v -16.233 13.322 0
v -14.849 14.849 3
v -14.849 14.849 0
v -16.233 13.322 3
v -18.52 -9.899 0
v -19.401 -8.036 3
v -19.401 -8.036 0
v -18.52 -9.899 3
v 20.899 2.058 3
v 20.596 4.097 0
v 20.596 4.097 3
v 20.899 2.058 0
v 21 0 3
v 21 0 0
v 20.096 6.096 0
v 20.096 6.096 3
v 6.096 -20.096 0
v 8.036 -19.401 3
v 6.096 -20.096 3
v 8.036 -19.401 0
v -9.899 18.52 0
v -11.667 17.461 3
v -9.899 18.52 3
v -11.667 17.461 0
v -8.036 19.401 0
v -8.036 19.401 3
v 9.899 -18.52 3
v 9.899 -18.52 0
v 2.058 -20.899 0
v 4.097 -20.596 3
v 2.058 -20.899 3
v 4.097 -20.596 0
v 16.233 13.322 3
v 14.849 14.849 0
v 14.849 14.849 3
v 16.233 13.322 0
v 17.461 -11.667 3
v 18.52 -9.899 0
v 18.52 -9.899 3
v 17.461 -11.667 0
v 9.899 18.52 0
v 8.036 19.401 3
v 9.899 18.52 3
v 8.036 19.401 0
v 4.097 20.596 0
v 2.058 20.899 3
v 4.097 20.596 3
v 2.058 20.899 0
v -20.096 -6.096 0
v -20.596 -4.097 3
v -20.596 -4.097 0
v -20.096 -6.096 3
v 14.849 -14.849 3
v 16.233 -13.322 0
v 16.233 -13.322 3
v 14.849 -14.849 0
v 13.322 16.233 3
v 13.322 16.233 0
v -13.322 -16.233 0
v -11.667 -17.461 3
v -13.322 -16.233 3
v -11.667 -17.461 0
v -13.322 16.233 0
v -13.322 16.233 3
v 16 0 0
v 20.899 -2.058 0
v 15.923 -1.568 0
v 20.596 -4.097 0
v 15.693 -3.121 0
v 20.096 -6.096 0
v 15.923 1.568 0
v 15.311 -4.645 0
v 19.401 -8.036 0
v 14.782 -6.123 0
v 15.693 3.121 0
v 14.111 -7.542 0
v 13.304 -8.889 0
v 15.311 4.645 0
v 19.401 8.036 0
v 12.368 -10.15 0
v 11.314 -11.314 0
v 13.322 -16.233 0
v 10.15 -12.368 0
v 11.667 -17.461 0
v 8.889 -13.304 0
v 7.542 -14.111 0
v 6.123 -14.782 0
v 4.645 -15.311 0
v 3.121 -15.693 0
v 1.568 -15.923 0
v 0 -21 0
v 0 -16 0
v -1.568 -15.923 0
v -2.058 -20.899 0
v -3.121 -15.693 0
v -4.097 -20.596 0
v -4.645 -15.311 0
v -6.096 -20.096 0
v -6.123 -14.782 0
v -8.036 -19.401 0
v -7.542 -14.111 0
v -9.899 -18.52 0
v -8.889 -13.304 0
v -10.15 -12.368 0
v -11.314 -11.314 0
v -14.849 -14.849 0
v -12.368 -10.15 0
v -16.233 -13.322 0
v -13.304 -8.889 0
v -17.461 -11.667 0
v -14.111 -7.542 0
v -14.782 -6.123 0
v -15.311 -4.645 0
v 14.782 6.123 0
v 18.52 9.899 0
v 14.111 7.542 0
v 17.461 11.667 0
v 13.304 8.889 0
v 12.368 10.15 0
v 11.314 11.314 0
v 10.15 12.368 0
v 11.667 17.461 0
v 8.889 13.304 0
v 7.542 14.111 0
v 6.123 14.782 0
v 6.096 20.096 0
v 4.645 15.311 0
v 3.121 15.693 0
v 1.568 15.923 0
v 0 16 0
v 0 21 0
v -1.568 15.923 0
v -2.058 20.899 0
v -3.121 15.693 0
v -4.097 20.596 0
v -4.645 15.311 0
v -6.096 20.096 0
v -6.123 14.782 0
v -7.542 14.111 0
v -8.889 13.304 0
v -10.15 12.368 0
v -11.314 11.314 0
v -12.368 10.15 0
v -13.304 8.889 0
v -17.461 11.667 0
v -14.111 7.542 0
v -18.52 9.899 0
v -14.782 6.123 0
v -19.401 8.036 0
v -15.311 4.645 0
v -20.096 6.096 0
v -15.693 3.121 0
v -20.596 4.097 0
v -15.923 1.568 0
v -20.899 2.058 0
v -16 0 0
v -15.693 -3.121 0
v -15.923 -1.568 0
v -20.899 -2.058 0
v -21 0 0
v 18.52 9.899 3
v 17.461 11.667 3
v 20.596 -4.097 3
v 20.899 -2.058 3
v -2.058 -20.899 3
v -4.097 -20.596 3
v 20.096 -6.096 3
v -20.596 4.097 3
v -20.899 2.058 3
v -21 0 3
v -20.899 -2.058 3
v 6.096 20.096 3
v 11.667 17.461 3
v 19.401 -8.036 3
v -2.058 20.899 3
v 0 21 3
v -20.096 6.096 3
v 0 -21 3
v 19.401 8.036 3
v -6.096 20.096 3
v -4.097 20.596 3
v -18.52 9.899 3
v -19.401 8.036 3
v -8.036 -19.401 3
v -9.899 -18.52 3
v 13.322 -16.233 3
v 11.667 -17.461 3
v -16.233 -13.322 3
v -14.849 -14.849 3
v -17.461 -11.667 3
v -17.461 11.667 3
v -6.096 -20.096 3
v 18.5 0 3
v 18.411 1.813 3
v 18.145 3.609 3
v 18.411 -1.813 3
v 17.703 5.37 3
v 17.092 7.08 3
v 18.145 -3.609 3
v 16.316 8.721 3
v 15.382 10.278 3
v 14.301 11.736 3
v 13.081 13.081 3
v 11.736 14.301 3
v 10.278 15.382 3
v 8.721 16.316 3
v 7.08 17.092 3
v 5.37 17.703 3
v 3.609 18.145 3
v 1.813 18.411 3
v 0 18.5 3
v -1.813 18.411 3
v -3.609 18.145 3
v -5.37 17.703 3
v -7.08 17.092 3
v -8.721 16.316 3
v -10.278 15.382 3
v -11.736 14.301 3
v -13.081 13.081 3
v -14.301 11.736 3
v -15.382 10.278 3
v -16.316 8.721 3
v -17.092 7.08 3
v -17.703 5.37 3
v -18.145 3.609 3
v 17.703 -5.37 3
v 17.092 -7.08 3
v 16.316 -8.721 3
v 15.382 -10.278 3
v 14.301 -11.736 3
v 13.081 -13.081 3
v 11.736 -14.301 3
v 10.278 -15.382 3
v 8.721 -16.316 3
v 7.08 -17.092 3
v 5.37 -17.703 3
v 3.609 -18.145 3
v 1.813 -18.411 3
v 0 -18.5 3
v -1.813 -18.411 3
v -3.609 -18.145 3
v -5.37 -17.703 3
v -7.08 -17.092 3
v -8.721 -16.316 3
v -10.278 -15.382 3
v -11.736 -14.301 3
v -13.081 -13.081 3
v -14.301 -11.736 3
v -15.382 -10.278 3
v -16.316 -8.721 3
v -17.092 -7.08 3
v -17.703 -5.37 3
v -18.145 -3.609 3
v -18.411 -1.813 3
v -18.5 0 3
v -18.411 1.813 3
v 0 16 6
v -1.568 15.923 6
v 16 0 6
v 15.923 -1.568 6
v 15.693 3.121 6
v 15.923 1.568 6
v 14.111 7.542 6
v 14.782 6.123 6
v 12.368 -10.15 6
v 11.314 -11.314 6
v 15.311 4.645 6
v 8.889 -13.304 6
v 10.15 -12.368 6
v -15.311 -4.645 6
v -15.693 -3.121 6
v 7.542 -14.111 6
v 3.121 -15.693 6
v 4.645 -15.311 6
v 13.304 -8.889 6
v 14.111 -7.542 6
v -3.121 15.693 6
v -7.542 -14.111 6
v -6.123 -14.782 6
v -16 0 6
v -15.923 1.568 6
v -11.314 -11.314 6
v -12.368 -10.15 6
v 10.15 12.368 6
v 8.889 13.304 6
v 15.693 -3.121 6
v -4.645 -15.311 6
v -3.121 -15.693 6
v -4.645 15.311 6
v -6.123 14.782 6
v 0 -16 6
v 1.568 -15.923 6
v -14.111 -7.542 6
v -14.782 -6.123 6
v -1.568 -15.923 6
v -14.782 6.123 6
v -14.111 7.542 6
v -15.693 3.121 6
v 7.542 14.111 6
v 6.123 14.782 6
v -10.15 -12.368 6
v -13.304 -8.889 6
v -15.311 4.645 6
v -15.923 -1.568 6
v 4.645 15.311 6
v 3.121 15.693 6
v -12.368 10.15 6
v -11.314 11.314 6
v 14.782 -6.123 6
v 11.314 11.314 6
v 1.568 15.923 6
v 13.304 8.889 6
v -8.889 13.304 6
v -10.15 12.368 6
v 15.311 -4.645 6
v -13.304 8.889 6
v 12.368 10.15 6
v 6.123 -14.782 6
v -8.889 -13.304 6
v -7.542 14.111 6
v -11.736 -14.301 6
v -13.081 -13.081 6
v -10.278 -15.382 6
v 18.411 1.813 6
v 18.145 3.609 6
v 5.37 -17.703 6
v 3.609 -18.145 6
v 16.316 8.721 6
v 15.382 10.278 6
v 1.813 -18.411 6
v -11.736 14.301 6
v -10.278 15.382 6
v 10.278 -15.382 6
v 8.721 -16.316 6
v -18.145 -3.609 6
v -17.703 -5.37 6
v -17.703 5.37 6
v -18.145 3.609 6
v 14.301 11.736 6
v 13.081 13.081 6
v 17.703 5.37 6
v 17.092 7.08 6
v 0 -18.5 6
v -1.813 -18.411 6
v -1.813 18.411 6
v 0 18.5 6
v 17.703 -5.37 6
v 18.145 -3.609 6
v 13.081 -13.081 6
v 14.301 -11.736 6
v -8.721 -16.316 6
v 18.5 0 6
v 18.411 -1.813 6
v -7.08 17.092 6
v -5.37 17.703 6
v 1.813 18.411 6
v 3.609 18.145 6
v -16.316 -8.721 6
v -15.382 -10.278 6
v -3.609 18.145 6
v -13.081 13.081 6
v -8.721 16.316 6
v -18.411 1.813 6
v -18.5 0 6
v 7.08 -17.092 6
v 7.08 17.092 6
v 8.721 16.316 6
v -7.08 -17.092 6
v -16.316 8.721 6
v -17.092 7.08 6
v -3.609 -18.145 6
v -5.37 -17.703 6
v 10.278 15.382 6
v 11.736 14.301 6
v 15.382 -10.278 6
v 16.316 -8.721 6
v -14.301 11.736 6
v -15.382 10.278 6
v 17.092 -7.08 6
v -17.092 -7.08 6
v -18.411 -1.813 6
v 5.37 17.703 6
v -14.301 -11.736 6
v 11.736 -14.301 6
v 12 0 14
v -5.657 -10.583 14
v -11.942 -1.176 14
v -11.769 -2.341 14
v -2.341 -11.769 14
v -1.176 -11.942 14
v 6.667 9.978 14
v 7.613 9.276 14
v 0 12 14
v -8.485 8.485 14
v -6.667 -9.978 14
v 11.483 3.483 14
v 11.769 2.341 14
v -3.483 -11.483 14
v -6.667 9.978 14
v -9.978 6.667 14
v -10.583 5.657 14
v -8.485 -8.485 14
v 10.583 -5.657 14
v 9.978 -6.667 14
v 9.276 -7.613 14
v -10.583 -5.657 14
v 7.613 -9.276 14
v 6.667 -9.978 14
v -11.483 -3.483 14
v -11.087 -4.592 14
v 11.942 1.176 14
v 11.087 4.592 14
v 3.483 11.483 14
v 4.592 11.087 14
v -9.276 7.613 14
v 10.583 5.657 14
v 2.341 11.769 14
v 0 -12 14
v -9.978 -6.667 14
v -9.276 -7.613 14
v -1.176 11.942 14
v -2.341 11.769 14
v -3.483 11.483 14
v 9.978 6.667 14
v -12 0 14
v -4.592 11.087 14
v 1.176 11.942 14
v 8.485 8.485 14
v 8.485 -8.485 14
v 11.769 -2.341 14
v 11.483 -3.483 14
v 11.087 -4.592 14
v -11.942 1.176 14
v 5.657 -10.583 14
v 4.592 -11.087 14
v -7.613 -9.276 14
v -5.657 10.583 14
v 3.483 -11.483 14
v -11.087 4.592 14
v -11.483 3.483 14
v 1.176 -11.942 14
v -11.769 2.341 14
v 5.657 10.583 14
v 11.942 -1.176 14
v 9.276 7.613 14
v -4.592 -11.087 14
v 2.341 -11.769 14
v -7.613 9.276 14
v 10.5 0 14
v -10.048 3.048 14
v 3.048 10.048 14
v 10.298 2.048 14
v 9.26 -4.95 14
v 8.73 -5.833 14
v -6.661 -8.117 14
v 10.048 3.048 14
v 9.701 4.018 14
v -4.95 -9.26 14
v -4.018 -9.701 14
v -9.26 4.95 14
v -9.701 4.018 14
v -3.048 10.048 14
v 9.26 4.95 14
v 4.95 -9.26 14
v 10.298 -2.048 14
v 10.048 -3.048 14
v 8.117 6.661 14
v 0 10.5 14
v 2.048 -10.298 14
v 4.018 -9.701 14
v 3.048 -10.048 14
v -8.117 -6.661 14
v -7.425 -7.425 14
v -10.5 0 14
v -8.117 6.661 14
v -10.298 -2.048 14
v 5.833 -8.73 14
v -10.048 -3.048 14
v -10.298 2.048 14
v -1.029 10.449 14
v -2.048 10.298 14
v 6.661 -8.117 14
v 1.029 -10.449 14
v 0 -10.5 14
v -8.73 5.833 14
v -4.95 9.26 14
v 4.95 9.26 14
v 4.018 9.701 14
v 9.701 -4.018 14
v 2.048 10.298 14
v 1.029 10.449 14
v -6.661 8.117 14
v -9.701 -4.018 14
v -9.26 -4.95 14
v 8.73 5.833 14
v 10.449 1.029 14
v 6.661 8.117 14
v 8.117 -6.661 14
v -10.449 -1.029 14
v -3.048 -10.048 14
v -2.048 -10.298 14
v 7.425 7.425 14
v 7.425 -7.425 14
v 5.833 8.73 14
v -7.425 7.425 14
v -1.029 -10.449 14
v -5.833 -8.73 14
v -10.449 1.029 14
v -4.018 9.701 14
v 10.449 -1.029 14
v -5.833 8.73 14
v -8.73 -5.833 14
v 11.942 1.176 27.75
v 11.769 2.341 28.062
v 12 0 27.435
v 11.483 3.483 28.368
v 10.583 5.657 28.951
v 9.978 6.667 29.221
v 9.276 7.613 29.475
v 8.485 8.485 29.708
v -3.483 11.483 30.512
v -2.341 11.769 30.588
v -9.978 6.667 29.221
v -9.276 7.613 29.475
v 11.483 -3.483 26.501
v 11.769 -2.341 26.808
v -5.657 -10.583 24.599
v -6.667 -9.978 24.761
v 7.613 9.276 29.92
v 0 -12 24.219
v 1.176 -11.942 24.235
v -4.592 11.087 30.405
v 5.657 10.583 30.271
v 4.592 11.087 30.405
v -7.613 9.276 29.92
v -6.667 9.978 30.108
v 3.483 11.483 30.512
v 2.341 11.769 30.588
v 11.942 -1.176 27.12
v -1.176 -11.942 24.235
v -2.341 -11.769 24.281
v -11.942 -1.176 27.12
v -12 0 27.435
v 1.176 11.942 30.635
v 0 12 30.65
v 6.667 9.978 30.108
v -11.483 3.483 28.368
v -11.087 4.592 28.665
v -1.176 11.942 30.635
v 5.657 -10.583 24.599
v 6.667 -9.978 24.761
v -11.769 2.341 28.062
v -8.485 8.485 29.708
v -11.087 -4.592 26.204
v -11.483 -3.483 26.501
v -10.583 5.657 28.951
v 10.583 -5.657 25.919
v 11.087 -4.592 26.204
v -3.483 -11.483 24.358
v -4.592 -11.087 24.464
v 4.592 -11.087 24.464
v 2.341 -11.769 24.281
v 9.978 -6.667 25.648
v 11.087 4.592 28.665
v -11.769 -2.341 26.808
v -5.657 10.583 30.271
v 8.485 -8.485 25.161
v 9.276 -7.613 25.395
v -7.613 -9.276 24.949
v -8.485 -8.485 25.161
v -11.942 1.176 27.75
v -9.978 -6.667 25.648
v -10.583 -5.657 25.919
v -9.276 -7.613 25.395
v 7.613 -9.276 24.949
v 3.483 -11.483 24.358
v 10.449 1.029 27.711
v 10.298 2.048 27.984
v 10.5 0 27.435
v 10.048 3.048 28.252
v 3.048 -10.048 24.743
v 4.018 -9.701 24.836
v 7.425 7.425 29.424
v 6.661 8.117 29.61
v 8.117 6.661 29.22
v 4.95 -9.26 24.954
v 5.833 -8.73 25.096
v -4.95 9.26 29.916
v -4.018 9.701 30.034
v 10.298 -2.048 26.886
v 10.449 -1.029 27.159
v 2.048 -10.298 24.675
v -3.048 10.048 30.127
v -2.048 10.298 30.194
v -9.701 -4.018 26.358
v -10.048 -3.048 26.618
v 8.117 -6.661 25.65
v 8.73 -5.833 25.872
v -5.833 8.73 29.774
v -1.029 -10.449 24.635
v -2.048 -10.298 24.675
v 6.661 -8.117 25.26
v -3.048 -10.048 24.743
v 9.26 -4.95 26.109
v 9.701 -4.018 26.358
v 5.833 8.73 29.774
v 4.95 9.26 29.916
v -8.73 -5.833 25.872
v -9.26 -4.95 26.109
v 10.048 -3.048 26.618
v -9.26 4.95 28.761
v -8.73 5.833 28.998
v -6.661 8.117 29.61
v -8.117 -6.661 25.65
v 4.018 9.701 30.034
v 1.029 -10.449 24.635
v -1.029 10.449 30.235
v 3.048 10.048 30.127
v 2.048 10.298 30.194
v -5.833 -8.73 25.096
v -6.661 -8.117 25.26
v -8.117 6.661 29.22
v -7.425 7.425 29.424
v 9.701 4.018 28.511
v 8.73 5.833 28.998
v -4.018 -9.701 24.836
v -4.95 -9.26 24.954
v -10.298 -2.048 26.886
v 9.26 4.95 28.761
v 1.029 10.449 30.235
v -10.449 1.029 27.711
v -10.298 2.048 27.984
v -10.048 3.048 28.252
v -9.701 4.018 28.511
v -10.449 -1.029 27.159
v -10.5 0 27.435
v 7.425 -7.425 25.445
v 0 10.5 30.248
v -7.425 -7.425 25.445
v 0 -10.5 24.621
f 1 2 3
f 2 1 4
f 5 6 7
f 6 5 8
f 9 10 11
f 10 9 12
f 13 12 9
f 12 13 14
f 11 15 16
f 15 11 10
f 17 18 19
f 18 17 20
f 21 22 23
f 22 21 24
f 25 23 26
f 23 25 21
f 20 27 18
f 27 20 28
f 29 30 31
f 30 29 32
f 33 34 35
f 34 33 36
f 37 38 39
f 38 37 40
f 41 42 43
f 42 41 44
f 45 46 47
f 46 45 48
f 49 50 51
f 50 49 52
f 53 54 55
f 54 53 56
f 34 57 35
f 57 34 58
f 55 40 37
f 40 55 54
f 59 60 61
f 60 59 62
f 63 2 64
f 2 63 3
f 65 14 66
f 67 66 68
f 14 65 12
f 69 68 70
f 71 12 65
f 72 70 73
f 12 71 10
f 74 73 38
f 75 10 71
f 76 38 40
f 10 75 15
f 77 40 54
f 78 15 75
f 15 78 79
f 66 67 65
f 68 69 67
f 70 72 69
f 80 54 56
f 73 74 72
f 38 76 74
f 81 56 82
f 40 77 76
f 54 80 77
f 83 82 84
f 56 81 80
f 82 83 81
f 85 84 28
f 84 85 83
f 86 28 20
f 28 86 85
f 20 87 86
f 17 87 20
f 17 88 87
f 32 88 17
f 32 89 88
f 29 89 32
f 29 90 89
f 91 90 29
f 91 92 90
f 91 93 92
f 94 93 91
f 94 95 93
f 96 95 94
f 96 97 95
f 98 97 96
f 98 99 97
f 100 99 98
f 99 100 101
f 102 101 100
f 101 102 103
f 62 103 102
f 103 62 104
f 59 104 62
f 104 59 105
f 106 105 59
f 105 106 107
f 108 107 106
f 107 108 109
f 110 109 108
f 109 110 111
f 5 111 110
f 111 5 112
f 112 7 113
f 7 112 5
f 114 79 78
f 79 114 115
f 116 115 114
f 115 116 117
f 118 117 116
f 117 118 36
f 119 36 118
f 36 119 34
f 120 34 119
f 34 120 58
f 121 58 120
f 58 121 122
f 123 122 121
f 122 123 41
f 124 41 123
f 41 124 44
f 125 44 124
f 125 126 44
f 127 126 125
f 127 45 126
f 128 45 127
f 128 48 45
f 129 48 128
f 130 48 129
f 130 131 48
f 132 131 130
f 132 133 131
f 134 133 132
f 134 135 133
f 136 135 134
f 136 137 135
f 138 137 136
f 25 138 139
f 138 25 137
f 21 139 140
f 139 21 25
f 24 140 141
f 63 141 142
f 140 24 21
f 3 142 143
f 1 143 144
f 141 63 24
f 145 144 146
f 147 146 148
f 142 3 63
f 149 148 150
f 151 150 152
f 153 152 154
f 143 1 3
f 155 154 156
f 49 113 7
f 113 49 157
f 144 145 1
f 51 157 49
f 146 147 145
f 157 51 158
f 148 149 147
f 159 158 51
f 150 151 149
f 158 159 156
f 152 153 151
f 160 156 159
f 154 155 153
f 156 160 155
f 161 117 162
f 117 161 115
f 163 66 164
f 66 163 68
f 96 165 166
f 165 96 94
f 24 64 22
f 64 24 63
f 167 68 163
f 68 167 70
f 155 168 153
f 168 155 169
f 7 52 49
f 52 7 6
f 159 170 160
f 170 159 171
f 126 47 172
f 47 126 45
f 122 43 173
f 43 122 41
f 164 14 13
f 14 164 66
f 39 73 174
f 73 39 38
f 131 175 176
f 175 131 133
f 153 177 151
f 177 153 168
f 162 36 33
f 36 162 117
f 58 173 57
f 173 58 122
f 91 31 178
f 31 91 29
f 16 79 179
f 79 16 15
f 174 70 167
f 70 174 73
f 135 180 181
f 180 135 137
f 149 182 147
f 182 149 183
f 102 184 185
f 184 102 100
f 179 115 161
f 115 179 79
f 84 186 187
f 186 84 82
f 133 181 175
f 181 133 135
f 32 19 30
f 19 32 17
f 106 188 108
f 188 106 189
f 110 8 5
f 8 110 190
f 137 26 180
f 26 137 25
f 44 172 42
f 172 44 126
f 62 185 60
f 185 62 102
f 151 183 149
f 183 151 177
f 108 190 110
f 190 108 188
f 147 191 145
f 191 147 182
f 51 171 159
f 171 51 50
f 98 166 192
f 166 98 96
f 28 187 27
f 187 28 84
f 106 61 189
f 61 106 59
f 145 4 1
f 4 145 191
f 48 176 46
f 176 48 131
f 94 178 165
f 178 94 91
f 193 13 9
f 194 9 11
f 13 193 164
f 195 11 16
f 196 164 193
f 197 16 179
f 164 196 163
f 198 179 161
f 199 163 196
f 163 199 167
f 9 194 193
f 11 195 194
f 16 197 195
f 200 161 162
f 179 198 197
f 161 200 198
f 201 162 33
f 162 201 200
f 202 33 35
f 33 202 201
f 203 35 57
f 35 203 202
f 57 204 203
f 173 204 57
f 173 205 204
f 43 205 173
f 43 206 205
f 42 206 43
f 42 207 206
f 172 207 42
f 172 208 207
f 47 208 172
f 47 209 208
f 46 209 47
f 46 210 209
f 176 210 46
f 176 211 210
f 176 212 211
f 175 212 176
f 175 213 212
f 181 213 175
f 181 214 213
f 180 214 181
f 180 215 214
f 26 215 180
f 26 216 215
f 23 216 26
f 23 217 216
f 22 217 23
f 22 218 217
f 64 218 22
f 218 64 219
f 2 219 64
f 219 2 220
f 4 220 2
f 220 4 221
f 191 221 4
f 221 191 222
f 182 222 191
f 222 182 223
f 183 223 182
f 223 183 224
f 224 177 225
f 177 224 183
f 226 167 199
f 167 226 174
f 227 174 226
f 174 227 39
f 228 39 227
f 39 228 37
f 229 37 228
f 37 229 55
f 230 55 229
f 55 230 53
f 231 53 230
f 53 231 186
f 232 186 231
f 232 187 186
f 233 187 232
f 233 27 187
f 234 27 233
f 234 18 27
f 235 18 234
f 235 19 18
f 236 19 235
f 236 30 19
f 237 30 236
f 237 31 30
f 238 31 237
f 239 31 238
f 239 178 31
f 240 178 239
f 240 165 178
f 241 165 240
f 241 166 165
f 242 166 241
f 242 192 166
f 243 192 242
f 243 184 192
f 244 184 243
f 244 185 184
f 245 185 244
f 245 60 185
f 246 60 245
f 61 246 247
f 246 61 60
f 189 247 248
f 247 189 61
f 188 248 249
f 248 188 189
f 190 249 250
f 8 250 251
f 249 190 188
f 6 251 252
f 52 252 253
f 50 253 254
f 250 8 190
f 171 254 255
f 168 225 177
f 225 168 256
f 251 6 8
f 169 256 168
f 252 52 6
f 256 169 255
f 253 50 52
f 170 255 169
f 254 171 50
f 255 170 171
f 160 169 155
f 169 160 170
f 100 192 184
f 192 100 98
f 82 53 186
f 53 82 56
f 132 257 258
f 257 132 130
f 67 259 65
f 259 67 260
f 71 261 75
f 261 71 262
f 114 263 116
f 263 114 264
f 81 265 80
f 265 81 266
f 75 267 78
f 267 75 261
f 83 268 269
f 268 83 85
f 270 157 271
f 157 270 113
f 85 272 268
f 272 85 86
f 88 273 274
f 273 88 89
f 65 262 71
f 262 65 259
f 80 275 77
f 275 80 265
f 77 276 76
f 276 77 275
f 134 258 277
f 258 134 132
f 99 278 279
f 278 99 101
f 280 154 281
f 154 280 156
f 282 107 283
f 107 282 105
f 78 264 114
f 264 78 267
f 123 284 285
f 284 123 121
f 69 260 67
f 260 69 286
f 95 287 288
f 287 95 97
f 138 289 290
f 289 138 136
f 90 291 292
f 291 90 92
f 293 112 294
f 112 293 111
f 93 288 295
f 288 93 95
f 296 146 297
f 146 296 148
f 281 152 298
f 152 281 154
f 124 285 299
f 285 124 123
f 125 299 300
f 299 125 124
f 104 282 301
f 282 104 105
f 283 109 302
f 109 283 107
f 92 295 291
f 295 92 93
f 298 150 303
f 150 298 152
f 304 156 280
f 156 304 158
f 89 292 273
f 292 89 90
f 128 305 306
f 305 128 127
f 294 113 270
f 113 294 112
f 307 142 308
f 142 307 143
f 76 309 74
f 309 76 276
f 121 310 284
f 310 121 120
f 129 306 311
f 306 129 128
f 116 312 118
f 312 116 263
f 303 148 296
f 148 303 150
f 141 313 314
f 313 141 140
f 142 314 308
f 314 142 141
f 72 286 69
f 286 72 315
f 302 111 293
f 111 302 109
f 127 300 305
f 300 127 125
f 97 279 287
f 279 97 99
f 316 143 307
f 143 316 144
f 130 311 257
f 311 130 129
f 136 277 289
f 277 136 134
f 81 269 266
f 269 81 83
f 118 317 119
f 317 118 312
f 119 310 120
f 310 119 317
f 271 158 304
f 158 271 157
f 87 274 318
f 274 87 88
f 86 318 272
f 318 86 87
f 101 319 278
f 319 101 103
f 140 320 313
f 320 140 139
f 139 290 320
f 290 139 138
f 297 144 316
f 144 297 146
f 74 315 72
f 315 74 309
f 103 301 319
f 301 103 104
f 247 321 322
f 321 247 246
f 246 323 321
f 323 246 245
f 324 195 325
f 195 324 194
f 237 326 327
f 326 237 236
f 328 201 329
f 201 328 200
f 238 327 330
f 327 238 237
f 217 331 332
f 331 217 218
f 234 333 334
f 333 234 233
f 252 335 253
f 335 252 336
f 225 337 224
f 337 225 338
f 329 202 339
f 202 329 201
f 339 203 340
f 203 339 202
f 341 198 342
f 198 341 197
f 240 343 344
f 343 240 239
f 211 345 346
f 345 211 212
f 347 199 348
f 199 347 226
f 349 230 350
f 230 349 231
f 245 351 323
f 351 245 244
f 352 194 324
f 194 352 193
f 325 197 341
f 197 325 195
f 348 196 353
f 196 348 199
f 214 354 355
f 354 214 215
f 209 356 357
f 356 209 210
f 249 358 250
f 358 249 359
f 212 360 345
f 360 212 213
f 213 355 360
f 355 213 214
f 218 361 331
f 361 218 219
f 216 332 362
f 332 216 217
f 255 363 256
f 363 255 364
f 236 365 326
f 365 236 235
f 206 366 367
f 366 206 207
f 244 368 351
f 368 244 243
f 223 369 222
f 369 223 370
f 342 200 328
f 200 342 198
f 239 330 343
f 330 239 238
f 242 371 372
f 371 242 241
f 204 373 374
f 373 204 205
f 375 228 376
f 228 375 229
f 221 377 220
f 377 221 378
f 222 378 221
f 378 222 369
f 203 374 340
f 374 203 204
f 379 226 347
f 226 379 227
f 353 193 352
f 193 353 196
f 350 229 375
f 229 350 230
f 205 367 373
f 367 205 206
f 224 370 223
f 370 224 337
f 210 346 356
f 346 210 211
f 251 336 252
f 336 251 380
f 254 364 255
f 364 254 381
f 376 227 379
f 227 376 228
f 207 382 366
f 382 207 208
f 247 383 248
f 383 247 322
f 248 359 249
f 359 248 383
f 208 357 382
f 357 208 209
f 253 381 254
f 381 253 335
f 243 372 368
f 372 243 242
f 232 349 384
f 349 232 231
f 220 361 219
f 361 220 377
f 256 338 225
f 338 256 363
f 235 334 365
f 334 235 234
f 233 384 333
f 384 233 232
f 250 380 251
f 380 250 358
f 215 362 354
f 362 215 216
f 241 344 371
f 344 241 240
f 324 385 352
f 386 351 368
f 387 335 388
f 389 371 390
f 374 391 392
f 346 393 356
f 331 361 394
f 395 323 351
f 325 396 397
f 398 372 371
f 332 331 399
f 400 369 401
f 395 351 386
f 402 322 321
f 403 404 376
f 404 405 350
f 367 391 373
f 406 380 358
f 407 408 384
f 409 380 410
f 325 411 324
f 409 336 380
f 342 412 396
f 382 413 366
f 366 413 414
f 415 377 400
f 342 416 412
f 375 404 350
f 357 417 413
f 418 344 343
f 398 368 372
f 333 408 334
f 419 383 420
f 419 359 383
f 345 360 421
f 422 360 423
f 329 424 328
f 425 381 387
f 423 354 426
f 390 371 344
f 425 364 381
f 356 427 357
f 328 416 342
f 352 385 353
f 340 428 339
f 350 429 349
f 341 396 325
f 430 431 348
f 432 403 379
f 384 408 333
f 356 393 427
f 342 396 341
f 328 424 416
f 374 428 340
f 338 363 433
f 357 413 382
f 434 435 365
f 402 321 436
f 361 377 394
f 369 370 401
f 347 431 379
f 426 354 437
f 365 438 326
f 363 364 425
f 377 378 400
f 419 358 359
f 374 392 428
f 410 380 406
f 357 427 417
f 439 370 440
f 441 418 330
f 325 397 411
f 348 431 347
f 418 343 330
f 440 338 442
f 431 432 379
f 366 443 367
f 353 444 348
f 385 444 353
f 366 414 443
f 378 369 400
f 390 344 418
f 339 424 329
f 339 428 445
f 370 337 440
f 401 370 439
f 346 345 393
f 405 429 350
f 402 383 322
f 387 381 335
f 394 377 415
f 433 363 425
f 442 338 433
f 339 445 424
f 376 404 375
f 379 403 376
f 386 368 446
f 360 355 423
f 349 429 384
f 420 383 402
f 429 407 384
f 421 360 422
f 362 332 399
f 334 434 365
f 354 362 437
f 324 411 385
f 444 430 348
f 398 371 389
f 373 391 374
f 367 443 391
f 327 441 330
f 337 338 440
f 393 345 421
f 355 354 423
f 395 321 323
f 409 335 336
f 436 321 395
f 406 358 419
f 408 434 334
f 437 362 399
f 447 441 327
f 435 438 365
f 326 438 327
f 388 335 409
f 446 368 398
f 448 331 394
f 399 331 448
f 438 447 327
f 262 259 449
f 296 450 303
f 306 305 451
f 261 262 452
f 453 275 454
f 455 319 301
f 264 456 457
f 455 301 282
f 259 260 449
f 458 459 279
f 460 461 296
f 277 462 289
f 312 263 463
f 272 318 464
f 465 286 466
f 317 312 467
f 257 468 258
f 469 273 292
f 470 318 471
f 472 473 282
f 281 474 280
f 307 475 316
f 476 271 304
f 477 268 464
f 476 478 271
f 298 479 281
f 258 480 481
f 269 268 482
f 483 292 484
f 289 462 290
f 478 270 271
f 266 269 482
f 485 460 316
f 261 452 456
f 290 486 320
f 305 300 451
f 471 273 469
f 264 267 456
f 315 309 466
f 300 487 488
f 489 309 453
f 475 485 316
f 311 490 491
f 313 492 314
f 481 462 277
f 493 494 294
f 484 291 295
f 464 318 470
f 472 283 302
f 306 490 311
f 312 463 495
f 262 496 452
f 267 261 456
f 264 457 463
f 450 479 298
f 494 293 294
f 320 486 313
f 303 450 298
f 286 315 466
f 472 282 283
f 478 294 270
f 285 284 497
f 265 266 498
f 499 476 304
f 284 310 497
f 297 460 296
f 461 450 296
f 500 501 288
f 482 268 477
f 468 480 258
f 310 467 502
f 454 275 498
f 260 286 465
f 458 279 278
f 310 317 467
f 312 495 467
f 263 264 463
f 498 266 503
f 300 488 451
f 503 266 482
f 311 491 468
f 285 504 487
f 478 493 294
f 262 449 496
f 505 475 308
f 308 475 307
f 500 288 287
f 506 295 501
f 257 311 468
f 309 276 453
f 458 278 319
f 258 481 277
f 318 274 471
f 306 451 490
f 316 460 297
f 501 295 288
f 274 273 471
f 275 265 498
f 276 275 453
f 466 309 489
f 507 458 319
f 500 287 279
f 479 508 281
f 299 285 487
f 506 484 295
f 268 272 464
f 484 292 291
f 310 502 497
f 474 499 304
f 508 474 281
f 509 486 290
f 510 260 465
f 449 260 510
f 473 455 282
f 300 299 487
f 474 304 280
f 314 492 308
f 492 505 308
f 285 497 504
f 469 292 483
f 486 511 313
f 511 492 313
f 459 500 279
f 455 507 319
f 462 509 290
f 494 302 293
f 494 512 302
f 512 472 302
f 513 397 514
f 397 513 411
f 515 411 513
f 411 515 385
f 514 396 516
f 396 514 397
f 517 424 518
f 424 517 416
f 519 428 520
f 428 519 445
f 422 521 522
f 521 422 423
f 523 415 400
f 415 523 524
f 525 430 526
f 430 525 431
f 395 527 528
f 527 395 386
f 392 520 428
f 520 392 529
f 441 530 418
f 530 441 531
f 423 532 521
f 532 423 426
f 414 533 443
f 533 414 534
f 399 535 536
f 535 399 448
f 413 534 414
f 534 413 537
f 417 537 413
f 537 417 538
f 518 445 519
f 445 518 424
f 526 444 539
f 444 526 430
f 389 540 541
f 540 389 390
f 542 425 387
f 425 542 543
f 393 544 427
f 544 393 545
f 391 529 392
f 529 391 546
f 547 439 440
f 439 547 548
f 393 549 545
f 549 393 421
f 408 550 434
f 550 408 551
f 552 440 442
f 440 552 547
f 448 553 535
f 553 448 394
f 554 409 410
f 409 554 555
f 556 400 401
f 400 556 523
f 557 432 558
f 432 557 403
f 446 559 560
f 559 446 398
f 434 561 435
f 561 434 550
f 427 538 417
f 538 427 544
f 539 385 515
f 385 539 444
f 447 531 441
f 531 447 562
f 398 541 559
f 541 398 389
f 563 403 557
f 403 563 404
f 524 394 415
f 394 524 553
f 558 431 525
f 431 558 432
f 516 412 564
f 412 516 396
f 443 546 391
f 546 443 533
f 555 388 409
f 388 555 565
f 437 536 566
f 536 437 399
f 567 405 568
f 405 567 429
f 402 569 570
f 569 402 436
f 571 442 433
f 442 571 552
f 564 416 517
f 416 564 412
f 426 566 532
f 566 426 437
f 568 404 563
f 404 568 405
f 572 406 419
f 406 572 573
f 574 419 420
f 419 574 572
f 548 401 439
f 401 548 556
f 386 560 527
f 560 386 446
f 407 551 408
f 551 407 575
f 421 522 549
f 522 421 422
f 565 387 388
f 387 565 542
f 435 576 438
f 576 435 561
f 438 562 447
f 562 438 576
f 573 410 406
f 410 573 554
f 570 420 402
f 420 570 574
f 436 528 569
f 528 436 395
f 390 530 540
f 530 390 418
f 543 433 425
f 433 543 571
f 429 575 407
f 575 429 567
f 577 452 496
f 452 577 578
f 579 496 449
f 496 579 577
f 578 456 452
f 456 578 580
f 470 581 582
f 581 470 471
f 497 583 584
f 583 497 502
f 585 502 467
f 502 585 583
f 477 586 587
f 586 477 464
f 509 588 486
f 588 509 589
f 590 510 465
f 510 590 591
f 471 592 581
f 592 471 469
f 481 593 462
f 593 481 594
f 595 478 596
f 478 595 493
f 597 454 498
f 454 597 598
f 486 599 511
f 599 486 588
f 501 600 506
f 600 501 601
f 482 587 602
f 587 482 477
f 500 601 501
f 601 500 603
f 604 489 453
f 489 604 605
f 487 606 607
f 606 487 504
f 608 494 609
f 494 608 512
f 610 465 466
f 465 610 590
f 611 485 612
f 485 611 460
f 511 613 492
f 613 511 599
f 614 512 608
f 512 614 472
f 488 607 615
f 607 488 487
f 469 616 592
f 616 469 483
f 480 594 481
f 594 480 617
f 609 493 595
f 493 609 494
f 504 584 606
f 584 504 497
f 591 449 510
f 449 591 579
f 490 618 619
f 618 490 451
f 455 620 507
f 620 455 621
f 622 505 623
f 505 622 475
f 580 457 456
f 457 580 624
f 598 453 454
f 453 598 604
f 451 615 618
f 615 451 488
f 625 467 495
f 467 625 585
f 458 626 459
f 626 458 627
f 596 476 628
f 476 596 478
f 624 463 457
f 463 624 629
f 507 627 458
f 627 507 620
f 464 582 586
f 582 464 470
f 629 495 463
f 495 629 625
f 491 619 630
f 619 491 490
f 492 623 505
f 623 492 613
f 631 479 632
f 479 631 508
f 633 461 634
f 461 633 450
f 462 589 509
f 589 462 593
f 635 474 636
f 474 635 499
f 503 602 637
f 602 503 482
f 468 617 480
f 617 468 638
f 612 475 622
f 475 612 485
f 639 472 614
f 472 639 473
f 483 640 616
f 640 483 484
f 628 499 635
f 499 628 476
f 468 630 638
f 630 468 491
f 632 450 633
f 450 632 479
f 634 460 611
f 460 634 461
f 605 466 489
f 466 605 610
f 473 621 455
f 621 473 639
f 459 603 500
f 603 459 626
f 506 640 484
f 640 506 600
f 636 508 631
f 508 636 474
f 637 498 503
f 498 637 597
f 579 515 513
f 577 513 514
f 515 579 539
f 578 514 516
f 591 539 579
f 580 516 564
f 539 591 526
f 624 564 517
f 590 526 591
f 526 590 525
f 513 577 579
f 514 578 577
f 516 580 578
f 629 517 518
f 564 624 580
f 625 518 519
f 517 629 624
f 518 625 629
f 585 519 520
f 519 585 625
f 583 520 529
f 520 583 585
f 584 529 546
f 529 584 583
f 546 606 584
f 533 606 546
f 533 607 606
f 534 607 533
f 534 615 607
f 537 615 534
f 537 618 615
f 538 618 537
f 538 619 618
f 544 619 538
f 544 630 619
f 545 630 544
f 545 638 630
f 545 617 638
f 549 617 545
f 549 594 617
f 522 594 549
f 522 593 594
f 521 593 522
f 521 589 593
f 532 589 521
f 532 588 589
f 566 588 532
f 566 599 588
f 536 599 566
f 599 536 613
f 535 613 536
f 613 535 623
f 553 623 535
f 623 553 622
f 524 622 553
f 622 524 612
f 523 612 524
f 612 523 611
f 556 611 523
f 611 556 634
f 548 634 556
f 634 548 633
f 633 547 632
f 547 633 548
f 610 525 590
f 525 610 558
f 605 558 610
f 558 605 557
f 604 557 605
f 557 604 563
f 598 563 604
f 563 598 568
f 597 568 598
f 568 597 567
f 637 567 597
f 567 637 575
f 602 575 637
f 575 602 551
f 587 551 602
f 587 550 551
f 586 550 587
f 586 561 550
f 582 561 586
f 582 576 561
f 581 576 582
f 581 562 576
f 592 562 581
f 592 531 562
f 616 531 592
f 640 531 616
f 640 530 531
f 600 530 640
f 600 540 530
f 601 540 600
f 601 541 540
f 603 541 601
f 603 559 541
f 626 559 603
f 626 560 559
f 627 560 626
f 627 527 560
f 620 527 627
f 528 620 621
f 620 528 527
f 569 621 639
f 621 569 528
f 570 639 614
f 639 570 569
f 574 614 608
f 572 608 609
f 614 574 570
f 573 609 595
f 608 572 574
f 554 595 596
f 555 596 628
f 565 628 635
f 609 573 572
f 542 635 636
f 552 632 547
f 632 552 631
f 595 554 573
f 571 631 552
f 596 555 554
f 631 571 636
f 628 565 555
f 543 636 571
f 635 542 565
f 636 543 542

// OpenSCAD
// the first one of these I tried to print, the flange on
// top was printed as a series of concentric circles which didn't
// adhere well to the rest and cracked off.  So I've made the
// flange slightly thicker and printed it with 100mm bottom
// thickness so that the whole thing is filled with plywood-
// like zigzag layers.  Hopefully that will be more robust!
// The spout part is all still concentric walls but it's under
// no load so should be okay.

$fn=64;

od1 = 42;
id1 = 32;
h1 = 3;

od2 = 37;
id2 = 32;
h2 = 3;

od3 = 24;
id3 = 21;
h3 = 8;

h4 = 17;

intersection() {
 
    union() {   
        difference() {
            cylinder(d=od1, h=h1);
            cylinder(d=id1, h=h1);
        }
        translate([0,0,h1]) difference() {
            cylinder(d=od2, h=h2);
            cylinder(d1=id1, d2=id2, h=h2);
        }
        translate([0,0,h1+h2]) difference() {
            cylinder(d1=od2,d2=od3,h=h3);
            cylinder(d1=id2,d2=id3,h=h3);
        }
        translate([0,0,h1+h2+h3]) difference() {
            cylinder(d=od3,h=h4);
            cylinder(d=id3,h=h4);
        }
    }
    rotate([15,0,0]) cube([200,200,53],center=true);
}
